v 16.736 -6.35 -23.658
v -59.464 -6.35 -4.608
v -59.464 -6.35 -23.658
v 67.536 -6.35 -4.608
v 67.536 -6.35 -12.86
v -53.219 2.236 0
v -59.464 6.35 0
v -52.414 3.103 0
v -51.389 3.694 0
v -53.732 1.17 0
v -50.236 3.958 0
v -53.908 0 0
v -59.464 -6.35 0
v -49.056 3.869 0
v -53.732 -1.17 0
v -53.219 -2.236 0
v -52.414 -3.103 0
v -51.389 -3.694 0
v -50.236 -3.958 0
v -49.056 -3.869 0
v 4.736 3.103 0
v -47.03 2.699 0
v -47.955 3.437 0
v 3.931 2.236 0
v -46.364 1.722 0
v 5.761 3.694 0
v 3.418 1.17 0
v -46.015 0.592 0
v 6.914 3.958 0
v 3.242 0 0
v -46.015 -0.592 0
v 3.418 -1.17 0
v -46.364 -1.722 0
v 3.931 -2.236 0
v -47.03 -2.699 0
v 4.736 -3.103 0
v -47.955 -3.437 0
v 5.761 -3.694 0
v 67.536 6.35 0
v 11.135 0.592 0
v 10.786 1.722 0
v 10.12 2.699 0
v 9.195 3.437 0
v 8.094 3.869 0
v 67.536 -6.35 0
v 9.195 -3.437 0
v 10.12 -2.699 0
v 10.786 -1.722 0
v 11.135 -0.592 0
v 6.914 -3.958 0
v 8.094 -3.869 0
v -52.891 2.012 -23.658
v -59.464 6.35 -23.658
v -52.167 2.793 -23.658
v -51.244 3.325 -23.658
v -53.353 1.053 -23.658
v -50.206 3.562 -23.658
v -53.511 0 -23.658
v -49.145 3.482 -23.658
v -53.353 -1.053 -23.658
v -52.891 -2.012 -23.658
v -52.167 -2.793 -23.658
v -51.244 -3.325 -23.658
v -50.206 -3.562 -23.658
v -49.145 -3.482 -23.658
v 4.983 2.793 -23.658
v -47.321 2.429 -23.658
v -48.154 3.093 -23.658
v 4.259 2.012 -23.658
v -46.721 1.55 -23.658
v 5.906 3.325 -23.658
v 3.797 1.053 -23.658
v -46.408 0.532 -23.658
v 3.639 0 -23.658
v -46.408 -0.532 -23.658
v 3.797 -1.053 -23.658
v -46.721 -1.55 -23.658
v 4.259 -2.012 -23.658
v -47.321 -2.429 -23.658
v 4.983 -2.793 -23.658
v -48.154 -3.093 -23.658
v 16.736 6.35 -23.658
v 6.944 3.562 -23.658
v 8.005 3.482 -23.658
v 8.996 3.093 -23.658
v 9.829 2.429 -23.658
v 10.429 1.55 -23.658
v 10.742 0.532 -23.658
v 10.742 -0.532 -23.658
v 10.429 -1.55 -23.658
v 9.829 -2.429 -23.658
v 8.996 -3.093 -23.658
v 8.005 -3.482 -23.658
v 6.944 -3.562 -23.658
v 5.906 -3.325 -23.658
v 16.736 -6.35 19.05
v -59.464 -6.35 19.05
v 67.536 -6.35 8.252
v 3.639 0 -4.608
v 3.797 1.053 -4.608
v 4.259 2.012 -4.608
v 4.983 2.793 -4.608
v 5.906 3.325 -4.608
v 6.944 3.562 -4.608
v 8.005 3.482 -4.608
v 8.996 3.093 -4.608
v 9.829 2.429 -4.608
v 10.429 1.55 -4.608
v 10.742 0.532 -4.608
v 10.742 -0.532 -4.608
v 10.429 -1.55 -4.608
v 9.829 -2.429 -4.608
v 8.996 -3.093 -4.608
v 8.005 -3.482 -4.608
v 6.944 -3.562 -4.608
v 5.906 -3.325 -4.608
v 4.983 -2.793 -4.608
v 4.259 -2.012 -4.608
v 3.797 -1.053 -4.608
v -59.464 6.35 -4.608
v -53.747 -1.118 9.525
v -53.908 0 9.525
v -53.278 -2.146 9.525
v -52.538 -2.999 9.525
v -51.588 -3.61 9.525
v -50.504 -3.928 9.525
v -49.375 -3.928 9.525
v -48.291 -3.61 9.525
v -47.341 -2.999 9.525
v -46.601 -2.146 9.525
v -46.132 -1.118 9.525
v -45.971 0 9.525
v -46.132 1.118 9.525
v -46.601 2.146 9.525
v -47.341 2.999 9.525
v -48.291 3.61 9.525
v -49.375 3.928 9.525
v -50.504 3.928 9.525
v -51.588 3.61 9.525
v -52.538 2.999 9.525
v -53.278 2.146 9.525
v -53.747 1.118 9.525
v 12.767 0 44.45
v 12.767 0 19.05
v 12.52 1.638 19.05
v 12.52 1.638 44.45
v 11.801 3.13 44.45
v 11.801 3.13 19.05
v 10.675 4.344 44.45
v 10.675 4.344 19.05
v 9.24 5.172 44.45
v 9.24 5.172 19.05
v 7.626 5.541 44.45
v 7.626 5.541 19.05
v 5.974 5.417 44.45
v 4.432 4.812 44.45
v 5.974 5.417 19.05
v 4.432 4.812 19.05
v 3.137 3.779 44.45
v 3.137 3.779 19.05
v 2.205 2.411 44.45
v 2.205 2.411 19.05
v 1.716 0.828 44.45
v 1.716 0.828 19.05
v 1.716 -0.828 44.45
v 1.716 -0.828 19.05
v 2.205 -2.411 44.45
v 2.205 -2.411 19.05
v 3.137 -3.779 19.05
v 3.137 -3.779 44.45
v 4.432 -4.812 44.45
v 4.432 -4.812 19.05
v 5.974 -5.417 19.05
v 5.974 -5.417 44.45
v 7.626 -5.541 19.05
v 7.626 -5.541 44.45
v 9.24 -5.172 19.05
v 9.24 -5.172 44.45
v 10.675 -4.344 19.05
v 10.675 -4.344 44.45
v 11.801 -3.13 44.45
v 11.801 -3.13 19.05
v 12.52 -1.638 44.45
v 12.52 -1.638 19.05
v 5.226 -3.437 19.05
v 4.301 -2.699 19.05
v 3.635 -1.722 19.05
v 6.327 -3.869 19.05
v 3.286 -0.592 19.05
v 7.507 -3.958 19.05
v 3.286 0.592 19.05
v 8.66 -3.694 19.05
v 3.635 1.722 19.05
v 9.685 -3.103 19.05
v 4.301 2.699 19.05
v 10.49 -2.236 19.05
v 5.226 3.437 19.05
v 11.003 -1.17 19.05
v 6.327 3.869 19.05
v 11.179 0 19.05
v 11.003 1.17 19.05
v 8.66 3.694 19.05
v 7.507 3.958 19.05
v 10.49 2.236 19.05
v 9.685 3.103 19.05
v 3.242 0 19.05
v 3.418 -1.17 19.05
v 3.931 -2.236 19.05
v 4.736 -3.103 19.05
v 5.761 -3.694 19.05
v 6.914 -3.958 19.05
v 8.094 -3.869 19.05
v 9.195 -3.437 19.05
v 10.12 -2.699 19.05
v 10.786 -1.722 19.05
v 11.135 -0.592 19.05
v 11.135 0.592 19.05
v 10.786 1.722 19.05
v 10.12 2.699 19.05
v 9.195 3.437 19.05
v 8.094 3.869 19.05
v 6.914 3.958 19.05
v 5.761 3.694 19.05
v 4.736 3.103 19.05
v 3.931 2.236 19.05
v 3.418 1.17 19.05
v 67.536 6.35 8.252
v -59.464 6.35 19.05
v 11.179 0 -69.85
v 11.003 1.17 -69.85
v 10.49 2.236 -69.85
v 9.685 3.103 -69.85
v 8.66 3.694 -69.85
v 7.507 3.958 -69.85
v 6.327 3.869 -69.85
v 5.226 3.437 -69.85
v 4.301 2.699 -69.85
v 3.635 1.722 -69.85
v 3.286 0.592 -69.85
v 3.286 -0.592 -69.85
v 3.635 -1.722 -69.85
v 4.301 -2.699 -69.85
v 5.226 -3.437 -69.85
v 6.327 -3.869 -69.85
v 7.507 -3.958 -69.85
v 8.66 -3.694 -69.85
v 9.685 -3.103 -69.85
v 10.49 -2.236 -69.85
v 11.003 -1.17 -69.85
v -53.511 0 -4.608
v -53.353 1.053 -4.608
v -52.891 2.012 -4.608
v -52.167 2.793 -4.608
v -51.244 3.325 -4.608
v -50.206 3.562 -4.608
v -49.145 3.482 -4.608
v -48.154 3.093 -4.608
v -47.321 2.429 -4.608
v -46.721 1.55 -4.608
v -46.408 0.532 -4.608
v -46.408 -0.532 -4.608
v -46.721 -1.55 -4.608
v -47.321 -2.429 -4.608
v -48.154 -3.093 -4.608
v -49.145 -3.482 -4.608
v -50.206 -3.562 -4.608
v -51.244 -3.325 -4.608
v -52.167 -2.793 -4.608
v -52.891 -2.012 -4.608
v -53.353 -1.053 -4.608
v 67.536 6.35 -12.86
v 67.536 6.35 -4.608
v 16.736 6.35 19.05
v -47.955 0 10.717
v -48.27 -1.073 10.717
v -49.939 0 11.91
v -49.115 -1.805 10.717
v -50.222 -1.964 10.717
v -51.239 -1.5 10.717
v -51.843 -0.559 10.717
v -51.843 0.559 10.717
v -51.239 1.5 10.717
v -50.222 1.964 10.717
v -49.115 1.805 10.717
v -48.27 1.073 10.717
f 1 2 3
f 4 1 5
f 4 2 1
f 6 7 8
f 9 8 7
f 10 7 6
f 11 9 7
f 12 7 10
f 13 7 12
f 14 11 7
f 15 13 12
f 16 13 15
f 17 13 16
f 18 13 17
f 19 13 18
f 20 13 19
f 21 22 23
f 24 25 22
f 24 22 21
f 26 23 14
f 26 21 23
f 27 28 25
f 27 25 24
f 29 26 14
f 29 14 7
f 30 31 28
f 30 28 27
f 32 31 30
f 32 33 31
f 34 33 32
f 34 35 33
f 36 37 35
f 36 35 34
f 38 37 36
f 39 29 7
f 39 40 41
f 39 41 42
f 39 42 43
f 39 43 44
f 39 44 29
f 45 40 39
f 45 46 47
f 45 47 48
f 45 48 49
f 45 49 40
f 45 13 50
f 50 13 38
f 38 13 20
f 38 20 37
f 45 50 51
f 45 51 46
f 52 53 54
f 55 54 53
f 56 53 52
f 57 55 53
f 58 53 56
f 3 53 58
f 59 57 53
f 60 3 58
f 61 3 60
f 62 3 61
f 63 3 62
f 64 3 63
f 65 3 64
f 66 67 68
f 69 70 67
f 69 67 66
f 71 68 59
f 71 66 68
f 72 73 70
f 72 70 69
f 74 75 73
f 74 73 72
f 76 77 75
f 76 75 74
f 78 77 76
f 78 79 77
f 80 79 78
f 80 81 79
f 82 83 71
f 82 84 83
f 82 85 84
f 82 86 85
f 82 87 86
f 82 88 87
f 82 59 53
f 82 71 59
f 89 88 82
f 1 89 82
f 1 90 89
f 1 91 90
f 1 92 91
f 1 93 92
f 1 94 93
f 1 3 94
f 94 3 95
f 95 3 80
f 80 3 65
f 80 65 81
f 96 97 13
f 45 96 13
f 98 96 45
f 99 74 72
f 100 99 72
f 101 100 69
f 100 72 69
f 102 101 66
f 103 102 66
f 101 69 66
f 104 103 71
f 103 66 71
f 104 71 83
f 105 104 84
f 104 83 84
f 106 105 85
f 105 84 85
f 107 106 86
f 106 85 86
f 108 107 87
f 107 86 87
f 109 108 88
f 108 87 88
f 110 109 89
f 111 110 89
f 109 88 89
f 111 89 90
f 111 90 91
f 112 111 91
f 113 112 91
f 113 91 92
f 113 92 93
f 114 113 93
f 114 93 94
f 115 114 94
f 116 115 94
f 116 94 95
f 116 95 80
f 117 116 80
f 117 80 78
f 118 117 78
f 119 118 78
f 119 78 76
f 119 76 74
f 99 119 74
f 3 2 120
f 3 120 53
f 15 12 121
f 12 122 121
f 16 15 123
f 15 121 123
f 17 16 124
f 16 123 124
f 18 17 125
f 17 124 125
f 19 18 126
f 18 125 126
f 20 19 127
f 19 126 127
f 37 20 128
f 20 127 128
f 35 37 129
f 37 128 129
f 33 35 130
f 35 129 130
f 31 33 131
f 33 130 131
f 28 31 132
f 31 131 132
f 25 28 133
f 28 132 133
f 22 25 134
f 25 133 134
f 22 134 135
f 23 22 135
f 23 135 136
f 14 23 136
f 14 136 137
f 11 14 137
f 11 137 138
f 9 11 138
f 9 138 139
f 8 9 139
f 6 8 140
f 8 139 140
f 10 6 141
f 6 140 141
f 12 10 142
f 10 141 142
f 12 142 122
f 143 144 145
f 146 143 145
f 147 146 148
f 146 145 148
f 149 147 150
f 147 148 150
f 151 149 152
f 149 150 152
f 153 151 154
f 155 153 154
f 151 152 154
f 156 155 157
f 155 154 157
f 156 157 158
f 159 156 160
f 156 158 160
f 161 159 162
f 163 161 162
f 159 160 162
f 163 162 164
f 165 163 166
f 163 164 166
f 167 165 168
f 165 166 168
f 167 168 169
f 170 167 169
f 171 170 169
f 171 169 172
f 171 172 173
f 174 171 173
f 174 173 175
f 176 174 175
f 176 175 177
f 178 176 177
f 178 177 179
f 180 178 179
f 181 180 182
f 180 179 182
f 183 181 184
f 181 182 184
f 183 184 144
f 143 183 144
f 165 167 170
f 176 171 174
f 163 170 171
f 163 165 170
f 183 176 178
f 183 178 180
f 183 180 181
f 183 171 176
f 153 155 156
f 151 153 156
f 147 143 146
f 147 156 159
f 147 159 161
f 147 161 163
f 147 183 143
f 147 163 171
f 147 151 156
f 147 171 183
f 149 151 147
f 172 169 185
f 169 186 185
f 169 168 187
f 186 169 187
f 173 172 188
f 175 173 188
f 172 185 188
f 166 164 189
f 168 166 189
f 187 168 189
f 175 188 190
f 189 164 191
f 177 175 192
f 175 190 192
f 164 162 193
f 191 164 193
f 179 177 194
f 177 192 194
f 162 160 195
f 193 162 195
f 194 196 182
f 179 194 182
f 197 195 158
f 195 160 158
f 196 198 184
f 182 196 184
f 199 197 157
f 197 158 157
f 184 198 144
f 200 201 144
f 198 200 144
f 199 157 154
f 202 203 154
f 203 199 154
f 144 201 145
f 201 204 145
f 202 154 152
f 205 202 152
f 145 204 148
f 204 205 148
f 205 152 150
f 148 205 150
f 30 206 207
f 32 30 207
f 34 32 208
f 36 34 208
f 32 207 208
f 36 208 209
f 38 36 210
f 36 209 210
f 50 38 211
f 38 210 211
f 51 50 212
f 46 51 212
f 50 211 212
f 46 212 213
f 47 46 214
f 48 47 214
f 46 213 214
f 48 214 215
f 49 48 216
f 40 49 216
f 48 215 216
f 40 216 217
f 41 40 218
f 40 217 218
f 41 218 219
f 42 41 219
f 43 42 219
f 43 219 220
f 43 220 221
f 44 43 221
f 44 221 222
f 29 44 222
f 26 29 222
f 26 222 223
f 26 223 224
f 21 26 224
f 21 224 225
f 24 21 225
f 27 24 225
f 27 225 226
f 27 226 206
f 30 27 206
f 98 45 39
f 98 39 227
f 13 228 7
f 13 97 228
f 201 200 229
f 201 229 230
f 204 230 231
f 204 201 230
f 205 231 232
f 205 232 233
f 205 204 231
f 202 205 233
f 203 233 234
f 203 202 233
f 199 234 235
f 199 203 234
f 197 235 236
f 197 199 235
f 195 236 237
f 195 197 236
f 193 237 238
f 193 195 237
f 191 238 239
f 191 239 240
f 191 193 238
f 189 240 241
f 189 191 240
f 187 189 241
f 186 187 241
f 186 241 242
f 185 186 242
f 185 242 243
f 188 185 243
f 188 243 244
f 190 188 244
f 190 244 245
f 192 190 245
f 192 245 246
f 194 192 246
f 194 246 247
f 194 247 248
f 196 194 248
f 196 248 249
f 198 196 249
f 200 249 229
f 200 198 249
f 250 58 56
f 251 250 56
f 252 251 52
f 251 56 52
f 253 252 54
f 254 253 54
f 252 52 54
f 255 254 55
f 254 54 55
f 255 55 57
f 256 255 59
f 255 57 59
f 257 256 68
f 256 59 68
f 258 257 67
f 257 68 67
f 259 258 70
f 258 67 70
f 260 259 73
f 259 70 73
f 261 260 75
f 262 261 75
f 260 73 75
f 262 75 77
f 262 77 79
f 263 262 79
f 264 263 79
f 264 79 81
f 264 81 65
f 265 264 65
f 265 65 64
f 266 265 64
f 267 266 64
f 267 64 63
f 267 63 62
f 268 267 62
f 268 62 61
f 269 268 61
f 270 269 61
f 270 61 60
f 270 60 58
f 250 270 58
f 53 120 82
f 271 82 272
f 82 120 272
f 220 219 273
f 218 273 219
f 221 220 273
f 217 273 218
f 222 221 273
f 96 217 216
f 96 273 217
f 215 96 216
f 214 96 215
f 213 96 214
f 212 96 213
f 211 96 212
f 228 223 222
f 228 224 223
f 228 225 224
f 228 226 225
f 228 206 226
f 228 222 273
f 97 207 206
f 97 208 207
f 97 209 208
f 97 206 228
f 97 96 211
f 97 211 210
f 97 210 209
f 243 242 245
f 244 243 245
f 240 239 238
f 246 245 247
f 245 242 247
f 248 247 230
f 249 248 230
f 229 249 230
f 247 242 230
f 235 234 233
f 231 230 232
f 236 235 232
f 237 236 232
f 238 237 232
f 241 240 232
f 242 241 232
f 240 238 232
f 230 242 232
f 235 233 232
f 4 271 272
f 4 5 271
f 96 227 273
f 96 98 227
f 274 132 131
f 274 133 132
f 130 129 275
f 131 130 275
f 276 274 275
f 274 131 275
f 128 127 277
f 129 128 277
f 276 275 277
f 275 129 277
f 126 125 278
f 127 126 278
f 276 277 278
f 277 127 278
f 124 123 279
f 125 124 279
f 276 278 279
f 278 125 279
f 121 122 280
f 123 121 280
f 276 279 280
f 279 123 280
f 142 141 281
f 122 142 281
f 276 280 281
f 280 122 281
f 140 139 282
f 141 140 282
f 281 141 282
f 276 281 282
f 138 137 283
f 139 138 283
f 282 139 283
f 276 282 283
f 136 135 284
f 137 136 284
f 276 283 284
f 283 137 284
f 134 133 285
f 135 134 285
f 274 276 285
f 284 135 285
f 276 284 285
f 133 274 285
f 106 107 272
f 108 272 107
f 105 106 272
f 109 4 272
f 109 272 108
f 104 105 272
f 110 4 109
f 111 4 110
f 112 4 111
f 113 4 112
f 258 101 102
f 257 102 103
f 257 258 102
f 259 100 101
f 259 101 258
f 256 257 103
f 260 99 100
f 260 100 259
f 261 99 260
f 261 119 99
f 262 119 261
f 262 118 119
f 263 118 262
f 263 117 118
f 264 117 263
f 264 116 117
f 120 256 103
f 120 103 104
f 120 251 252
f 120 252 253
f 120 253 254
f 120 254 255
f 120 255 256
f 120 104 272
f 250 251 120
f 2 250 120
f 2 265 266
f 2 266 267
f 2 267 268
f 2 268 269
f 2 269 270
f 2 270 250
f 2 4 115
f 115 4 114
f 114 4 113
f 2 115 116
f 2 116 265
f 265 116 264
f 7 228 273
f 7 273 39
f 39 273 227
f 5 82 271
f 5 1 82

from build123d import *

# Parameters (mm, degrees)
F1_DEPTH = 6.35
F3_D     = 7.9375
F3_DEPTH = 9.525
F3_TIP   = 2.3846655818
F4_D     = 7.9375
F5_D     = 7.14375
F6_R     = 5.55625
F6_R_2   = 3.96875
F7_DEPTH = 25.4
F8_DEPTH = 88.9


with BuildPart() as f1:
    # F0 (on Front) → F1 (new body, symmetric)
    with BuildSketch(Plane.XZ):
        Polygon((-59.4644909084, 19.05), (-59.4644909084, 0), (67.5355090916, 0), (67.5355090916, 8.2521266672), (16.7355090916, 19.05), align=None)
    extrude(amount=F1_DEPTH, both=True)

    # F3
    with Locations(Plane(origin=(0, 0, 0), x_dir=(1, 0, 0), z_dir=(0, 0, -1))):
        with Locations((-49.9394909084, 0)):
            Hole(F3_D / 2, depth=F3_DEPTH)
            with Locations((0, 0, -(F3_DEPTH + F3_TIP / 2))):  # 118° drill point
                Cone(0, F3_D / 2, F3_TIP, mode=Mode.SUBTRACT)

    # F4 (through all)
    with Locations(Plane(origin=(0, 0, 0), x_dir=(1, 0, 0), z_dir=(0, 0, -1))):
        with Locations((7.2105090916, 0)):
            Hole(F4_D / 2)


with BuildPart() as f1b:
    # F0 (on Front) → F1, piece 2 (new body, symmetric)
    with BuildSketch(Plane.XZ):
        Polygon((67.5355090916, -4.6082309008), (-59.4644909084, -4.6082309008), (-59.4644909084, -23.6582309008), (16.7355090916, -23.6582309008), (67.5355090916, -12.8603575679), align=None)
    extrude(amount=F1_DEPTH, both=True)

    # F5 (through all)
    with Locations(Plane.XY):
        with Locations((-49.9394909084, 0), (7.2105090916, 0)):
            Hole(F5_D / 2)


with BuildPart() as f7:
    # F6 (on face) → F7 (new body)
    with BuildSketch(Plane.XY.offset(19.05)):
        with Locations((7.2105090916, 0)):
            Circle(F6_R)
        with Locations((7.2105090916, 0)):
            Circle(F6_R_2, mode=Mode.SUBTRACT)
        with Locations((7.2105090916, 0)):
            Circle(F6_R_2)
    extrude(amount=F7_DEPTH)

    # F6 (on face) → F8 (join)
    with BuildSketch(Plane.XY.offset(19.05)):
        with Locations((7.2105090916, 0)):
            Circle(F6_R_2)
    extrude(amount=-F8_DEPTH)


solid = Compound([f1.part, f1b.part, f7.part])
